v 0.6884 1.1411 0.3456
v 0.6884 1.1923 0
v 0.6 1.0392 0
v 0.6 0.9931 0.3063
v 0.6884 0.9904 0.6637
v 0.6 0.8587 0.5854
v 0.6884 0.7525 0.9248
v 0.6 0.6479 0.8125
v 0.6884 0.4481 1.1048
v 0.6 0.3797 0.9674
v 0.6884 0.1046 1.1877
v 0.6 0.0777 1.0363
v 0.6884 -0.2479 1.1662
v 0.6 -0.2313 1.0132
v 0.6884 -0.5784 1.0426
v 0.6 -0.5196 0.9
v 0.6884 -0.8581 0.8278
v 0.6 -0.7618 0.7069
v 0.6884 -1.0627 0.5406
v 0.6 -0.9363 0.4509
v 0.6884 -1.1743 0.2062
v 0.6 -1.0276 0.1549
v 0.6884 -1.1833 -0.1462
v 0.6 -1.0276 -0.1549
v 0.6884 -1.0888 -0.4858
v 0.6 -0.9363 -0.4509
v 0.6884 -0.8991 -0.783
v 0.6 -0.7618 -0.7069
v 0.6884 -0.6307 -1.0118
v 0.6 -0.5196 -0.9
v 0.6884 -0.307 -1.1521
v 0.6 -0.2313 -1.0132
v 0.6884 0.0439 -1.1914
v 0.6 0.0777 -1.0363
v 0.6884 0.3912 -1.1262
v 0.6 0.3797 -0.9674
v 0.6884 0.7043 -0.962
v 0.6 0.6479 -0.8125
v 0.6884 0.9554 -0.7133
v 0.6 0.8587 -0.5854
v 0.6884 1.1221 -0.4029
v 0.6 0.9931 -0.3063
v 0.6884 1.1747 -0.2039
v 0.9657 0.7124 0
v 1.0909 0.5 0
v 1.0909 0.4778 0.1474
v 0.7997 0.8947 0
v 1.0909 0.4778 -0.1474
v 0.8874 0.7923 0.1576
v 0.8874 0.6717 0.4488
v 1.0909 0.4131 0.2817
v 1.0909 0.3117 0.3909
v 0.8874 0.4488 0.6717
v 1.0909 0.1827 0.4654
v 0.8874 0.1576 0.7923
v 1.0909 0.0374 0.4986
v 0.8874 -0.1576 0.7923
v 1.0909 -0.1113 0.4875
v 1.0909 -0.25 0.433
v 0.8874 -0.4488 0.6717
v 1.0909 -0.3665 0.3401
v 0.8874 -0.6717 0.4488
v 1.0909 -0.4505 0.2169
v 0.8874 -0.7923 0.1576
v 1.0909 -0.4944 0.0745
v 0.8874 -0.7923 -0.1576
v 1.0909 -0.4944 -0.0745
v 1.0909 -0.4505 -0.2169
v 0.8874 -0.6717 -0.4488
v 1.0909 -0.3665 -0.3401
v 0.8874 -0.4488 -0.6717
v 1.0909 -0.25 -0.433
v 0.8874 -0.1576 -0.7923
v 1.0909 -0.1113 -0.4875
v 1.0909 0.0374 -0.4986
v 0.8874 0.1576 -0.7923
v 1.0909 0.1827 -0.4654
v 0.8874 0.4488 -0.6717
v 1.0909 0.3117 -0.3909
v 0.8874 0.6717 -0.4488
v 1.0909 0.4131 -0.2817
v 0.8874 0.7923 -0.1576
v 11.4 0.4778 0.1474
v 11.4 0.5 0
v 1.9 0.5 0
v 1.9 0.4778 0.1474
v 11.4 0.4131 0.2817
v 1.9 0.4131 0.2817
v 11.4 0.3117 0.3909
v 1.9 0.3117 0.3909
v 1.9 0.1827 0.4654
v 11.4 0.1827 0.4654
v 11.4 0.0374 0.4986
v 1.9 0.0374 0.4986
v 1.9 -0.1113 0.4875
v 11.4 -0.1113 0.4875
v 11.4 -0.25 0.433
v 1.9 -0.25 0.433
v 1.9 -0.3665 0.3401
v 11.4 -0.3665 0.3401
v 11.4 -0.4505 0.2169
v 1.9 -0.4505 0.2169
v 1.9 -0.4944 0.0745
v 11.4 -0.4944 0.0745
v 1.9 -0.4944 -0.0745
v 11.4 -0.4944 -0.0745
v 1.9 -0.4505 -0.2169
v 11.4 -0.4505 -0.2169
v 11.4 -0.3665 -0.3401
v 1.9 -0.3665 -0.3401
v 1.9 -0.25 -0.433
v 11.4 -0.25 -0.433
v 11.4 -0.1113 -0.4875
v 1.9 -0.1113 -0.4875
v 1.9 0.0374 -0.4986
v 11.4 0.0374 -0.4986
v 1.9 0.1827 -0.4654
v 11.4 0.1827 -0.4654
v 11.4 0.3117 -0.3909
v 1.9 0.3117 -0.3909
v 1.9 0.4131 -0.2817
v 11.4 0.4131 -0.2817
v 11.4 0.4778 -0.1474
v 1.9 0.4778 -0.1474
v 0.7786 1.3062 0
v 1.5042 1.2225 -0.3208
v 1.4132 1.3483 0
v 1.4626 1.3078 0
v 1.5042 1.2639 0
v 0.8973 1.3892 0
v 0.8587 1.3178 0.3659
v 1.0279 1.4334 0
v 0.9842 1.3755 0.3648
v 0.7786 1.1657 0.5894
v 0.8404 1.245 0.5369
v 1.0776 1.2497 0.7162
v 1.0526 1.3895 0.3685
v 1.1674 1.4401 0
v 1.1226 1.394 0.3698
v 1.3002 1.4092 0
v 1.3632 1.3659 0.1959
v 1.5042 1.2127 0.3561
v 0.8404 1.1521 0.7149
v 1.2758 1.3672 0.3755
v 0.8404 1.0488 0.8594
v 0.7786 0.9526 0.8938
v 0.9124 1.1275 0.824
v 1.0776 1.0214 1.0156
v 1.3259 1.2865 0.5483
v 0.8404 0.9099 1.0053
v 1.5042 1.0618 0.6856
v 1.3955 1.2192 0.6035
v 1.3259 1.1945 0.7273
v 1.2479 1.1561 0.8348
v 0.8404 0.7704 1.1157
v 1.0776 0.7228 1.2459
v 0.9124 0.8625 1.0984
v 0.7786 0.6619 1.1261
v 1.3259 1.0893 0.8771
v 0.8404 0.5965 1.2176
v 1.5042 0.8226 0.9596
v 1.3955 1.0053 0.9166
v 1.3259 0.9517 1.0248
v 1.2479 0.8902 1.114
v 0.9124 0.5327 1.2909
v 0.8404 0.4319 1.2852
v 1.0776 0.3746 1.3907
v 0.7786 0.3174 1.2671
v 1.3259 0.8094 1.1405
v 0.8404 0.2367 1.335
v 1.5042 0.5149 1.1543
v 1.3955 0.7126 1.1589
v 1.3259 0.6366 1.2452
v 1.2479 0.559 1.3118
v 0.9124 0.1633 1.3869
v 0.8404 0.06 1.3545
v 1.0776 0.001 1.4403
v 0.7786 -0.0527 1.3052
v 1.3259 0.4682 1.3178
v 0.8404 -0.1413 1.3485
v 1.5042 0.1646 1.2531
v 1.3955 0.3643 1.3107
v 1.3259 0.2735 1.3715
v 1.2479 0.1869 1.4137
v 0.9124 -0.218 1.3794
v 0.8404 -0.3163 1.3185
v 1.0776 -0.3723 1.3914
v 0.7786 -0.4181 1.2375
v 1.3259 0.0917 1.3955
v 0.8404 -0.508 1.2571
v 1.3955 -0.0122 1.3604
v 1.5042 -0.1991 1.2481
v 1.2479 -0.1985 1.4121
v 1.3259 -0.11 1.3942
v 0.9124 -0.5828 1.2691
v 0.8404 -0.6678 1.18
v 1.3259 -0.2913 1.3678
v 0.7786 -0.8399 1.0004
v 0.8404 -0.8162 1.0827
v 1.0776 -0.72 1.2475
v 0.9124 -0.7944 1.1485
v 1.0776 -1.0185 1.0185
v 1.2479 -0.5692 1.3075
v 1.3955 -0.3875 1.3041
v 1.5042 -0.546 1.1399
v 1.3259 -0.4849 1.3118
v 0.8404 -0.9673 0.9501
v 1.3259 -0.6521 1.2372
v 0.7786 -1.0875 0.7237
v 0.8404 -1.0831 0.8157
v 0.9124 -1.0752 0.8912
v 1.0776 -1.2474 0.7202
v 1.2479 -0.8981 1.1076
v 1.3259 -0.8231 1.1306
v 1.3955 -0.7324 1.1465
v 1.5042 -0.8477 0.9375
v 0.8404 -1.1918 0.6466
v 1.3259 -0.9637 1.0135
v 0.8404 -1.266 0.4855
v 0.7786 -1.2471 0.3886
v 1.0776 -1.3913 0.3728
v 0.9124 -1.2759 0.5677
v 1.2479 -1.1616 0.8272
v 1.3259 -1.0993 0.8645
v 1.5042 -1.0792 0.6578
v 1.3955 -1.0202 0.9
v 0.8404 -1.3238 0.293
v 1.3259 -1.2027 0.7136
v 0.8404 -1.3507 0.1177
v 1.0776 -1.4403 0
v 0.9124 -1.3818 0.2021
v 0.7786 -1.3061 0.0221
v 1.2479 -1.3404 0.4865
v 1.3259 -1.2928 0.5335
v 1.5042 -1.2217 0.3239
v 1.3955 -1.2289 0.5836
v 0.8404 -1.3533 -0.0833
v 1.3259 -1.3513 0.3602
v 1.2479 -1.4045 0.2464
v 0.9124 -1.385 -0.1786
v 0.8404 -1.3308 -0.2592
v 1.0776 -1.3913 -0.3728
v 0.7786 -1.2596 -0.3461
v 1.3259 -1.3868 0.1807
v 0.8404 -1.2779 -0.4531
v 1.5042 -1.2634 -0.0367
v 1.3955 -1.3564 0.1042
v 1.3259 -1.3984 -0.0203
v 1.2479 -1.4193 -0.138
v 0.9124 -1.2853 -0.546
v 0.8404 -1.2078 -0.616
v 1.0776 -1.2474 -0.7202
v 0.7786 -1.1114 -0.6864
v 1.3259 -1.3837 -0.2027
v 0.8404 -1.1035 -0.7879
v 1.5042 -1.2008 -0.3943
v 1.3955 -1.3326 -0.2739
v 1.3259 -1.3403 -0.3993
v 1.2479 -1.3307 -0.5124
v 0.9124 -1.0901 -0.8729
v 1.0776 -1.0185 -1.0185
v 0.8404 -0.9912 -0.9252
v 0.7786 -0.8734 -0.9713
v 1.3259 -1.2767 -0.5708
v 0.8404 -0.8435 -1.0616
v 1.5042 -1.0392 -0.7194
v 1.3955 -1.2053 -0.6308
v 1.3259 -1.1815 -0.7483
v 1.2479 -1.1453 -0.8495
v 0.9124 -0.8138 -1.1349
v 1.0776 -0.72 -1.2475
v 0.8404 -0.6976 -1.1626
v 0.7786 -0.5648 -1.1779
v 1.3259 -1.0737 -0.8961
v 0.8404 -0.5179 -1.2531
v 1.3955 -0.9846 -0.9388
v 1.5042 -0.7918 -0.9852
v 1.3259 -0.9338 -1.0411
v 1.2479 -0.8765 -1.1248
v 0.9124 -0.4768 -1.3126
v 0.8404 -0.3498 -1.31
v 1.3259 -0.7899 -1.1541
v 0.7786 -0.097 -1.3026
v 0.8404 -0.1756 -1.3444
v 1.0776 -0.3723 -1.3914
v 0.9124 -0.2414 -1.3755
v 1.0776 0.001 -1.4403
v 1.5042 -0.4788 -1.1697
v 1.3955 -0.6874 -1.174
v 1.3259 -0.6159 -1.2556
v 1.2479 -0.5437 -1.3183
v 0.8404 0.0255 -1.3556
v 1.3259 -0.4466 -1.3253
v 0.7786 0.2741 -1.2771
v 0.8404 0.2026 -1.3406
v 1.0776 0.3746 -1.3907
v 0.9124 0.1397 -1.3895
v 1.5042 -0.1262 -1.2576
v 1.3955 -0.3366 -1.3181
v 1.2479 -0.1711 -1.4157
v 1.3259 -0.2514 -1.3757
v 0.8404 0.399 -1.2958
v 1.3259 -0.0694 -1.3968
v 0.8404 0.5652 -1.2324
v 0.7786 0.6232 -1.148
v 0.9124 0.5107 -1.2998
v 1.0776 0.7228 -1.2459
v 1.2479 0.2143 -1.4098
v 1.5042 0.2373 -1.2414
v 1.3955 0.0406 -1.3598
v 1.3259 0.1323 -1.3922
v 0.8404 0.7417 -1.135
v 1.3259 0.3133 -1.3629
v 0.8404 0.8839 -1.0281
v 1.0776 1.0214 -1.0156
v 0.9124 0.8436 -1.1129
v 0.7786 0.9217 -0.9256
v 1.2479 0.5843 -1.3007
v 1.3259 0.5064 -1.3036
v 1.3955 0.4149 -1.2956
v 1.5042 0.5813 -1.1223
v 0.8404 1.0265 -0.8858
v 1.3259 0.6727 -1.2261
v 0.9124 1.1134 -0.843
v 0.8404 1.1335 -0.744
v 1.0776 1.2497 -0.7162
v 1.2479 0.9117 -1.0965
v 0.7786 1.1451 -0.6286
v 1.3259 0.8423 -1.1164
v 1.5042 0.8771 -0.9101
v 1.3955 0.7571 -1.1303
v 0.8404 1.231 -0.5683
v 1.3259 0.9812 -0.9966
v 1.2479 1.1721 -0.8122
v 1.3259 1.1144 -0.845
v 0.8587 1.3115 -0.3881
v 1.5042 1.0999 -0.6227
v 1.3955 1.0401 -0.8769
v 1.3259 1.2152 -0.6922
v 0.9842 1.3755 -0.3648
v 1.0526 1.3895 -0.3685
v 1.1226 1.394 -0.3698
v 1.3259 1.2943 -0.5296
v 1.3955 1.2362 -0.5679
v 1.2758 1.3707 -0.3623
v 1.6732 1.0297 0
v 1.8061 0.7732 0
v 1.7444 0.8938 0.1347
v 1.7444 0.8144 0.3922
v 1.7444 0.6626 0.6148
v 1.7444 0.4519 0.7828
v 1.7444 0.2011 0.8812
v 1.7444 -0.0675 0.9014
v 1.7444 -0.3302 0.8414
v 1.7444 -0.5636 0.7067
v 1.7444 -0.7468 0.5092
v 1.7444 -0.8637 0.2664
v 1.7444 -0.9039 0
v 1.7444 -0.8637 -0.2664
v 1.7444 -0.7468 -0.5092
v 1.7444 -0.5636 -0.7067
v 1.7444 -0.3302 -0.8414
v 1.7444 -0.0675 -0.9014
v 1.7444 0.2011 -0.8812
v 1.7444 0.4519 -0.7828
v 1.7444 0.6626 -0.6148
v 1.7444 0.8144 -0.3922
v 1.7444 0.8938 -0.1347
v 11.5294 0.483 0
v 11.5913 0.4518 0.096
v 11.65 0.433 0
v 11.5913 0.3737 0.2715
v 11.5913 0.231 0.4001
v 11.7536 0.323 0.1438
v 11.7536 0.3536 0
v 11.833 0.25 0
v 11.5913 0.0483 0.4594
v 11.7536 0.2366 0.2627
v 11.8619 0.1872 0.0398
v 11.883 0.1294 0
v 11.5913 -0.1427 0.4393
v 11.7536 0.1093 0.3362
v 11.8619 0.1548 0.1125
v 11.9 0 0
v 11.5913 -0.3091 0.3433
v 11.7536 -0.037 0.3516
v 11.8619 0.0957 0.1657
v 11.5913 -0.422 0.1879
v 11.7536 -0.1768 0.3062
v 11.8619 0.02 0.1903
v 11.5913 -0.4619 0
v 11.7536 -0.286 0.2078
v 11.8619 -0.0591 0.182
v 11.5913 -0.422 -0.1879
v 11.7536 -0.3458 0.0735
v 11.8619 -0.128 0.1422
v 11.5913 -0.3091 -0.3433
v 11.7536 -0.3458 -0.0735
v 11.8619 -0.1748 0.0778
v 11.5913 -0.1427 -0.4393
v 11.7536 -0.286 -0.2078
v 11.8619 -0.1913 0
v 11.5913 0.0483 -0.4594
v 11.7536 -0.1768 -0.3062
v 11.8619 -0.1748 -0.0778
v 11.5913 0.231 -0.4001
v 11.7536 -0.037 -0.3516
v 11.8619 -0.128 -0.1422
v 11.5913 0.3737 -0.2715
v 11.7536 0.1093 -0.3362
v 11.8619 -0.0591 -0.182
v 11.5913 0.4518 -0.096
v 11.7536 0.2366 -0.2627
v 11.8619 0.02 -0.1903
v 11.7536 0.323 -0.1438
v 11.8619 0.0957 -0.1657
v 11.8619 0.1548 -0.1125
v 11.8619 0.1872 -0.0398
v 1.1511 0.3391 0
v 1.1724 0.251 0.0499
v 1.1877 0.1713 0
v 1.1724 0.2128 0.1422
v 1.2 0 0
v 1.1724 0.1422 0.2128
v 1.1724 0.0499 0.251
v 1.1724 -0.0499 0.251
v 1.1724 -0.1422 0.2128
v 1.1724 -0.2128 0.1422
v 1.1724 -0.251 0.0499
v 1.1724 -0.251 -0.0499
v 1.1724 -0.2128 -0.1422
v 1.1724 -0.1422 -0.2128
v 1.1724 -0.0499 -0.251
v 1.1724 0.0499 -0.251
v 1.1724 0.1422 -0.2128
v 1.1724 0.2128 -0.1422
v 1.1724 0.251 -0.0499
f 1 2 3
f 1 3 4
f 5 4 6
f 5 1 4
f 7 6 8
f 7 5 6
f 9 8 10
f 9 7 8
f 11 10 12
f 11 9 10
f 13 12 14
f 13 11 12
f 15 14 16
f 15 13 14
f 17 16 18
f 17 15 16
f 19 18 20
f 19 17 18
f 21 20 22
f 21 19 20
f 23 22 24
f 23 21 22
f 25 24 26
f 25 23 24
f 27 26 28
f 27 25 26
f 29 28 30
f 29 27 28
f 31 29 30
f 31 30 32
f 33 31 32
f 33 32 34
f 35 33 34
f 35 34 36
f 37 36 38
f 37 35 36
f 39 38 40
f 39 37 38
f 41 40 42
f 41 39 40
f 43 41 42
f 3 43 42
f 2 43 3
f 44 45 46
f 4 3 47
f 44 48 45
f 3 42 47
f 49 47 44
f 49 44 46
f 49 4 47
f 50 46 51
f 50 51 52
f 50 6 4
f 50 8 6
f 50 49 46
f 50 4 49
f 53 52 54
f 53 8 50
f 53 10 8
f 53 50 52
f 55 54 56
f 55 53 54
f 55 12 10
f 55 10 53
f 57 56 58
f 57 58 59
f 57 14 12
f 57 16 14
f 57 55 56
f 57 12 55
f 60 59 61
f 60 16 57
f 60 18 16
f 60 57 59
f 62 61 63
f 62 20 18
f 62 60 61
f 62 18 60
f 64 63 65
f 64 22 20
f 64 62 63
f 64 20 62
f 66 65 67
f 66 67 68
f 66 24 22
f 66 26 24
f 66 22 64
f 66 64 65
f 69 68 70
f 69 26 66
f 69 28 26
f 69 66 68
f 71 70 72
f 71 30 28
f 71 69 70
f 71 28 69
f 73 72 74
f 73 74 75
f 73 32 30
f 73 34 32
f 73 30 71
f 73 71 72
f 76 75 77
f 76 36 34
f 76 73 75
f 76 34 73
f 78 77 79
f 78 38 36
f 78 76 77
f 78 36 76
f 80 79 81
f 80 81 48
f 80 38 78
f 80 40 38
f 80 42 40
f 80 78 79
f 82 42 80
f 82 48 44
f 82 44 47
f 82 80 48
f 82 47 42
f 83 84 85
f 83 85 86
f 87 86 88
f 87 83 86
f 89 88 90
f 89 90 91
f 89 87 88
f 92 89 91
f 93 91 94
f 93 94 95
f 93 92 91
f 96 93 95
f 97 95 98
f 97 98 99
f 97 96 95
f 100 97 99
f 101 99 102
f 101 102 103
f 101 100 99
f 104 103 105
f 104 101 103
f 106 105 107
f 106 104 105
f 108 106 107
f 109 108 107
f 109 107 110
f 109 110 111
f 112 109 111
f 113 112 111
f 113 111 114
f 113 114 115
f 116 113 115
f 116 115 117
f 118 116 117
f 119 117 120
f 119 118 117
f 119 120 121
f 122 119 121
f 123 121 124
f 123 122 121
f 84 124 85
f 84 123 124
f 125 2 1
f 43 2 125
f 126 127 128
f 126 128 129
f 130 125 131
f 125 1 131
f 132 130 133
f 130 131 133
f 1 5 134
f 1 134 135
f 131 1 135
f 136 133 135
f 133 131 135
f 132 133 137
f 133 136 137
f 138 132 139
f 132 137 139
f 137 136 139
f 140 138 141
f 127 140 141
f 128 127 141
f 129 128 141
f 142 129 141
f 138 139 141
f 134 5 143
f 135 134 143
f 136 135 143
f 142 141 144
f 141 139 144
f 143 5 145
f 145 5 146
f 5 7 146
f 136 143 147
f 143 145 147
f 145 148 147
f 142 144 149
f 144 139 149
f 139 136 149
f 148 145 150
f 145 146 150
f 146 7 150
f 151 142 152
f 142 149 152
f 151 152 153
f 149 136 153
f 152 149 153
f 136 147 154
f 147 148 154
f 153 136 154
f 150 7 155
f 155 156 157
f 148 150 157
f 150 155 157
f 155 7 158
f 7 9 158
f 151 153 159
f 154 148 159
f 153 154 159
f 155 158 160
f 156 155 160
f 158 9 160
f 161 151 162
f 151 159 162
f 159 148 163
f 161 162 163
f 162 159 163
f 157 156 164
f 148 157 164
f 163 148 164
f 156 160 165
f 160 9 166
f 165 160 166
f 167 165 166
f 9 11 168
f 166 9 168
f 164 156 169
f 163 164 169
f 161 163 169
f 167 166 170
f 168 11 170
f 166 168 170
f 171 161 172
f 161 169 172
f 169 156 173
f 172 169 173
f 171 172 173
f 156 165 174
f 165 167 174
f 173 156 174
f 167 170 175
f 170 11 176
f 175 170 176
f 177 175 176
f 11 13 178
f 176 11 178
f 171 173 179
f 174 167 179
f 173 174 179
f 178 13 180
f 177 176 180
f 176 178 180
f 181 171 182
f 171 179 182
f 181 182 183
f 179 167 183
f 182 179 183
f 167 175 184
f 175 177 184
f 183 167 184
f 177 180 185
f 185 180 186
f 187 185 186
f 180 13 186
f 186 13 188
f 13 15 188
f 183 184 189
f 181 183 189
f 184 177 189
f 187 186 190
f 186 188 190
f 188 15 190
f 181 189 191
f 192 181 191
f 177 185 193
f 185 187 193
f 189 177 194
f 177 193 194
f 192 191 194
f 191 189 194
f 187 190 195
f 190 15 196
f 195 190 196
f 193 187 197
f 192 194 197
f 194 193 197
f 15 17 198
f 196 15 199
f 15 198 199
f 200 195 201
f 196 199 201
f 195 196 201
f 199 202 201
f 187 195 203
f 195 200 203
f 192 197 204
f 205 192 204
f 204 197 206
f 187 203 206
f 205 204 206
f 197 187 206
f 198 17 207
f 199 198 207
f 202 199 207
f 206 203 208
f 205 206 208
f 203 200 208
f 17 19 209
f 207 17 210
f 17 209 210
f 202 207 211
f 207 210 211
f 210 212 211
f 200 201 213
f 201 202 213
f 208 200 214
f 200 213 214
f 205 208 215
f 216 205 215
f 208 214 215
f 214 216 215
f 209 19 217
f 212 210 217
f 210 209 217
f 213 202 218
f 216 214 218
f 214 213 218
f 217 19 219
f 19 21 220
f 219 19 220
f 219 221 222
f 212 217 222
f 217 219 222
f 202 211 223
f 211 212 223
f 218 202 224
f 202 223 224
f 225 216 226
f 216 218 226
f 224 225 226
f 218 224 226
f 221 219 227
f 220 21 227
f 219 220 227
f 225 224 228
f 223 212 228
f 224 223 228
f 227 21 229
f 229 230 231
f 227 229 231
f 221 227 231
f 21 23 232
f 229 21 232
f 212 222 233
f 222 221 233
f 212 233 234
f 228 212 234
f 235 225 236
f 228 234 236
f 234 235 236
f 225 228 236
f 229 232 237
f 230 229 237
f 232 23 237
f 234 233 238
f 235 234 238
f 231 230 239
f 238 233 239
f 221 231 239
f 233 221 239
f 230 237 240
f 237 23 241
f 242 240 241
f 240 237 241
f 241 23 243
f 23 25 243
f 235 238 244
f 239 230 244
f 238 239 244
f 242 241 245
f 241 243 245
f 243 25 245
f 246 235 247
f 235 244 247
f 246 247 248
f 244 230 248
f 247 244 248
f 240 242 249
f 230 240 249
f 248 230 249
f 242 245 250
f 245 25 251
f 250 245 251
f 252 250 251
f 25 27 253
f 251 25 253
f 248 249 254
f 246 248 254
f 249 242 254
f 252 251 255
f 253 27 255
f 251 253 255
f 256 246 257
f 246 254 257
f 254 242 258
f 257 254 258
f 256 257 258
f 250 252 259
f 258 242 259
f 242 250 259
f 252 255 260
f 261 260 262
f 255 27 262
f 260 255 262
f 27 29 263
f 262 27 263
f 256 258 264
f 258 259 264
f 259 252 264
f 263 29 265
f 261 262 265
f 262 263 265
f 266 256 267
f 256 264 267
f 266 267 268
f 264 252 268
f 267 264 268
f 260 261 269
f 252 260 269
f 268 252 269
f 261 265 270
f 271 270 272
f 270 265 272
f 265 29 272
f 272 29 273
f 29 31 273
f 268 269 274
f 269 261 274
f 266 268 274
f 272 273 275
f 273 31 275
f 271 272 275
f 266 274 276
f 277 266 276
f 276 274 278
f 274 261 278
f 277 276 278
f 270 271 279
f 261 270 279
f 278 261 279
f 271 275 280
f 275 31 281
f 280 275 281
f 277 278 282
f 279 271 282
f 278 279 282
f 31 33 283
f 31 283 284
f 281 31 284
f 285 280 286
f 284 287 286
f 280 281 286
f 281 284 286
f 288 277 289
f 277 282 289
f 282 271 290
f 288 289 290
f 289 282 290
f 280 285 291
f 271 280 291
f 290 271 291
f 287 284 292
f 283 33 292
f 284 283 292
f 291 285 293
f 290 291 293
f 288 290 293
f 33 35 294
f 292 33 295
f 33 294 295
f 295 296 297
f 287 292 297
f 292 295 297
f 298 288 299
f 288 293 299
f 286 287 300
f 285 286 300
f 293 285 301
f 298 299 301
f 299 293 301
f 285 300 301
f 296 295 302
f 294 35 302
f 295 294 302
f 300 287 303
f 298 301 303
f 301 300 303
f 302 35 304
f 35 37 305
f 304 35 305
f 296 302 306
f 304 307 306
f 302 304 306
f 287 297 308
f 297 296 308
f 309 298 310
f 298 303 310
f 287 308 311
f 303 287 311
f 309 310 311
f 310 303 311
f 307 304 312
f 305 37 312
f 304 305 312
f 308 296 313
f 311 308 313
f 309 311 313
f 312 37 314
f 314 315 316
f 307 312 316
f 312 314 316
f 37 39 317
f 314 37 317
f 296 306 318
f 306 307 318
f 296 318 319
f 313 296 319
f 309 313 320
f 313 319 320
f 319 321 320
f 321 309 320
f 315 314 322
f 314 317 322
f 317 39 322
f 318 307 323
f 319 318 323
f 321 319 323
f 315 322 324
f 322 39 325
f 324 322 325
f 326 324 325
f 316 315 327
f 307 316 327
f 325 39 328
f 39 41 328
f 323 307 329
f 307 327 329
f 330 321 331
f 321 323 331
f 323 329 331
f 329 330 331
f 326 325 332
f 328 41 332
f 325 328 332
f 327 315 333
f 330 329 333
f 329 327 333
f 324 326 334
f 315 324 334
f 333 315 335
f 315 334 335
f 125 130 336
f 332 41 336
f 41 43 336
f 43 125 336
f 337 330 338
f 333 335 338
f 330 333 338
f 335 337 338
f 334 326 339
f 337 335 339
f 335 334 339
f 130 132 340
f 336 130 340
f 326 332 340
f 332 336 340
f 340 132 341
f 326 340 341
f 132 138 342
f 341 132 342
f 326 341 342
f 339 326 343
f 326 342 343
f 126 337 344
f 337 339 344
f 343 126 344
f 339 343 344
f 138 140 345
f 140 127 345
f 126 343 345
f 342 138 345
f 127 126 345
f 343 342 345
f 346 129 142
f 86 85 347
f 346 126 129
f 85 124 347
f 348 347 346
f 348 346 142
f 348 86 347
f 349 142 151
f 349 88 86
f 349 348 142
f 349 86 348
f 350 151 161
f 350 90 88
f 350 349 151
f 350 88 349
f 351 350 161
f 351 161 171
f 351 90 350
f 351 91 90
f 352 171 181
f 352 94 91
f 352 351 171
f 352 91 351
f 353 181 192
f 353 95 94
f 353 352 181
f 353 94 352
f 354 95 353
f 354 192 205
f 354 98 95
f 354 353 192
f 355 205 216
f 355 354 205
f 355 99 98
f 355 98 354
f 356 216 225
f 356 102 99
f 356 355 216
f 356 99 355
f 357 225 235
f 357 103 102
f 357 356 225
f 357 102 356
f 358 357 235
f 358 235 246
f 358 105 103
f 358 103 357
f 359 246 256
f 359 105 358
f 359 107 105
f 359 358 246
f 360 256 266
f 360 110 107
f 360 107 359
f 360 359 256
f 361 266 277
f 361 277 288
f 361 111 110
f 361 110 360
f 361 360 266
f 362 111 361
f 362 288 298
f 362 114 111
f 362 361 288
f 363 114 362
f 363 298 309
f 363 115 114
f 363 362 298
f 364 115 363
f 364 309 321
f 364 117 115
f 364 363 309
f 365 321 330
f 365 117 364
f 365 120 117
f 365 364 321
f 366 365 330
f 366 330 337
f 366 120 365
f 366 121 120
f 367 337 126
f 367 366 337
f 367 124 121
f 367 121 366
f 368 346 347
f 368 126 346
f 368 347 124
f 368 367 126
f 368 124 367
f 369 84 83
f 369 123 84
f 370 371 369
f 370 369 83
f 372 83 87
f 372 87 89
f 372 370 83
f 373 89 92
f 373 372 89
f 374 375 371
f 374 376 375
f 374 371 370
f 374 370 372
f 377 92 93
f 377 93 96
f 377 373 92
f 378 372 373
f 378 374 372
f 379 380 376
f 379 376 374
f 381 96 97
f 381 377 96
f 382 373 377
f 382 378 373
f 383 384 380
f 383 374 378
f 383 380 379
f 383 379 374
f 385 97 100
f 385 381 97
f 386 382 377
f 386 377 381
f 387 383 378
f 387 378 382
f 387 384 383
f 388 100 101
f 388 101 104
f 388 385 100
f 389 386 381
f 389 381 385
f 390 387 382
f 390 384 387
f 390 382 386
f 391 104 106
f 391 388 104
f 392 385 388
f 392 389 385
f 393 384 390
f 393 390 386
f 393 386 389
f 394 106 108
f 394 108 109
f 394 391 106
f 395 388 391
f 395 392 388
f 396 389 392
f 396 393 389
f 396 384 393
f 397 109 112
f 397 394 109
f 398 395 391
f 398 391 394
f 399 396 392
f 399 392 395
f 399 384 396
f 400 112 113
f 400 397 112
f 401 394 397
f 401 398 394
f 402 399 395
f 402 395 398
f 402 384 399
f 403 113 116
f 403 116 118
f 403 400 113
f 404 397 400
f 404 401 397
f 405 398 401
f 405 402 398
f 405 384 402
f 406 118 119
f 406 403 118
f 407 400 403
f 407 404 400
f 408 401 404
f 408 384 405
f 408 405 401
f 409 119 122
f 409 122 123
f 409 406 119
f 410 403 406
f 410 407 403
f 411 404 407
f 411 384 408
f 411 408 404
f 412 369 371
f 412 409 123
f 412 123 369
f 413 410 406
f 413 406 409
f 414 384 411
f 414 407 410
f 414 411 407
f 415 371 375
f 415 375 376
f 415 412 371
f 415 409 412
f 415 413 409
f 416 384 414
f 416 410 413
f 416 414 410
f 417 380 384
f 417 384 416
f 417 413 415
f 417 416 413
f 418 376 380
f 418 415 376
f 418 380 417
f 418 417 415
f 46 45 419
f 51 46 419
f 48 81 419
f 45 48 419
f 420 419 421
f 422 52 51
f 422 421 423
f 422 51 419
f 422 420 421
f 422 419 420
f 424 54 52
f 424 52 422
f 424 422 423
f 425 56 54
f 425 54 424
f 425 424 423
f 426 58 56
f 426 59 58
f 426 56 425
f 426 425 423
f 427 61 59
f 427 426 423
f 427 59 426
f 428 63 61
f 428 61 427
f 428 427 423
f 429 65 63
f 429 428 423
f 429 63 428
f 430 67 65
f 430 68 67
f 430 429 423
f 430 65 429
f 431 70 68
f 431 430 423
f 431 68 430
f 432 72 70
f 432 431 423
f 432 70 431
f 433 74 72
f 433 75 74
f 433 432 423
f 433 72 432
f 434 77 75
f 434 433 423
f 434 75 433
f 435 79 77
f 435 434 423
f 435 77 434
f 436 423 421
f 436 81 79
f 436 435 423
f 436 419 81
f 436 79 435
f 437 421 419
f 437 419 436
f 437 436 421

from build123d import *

# Parameters (mm, degrees)
FILLET_1_R = 0.5


with BuildPart() as part:
    # 草图1 → 旋转2 (revolve)
    with BuildSketch(Plane.XY):
        with BuildLine():
            Line((1.9, 0.5), (11.9, 0.5))
            Line((11.9, 0.5), (11.9, 0))
            Line((11.9, 0), (4, 0))
            Line((4, 0), (3.266776521, 0))
            Line((3.266776521, 0), (1.729753624, 0))
            Line((1.729753624, 0), (1.2, 0))
            ThreePointArc((1.2, 0), (1.172400412, 0.255885273), (1.090871211, 0.5))
            ThreePointArc((1.090871211, 0.5), (0.887385904, 0.807803353), (0.6, 1.039230485))
            Line((0.6, 1.039230485), (0.982344135, 1.701469953))
            ThreePointArc((0.982344135, 1.701469953), (1.561364608, 1.192535349), (1.9, 0.5))
        make_face()
    revolve(axis=Axis((0, 0, 0), (1, 0, 0)))

    # 圆角1
    fillet_1_edges = [part.edges().sort_by_distance(p)[0] for p in [
        (11.9, -0.5, 0),
        (0.982344135, -1.701469953, 0),
    ]]
    fillet(fillet_1_edges, radius=FILLET_1_R)


solid = part.part
